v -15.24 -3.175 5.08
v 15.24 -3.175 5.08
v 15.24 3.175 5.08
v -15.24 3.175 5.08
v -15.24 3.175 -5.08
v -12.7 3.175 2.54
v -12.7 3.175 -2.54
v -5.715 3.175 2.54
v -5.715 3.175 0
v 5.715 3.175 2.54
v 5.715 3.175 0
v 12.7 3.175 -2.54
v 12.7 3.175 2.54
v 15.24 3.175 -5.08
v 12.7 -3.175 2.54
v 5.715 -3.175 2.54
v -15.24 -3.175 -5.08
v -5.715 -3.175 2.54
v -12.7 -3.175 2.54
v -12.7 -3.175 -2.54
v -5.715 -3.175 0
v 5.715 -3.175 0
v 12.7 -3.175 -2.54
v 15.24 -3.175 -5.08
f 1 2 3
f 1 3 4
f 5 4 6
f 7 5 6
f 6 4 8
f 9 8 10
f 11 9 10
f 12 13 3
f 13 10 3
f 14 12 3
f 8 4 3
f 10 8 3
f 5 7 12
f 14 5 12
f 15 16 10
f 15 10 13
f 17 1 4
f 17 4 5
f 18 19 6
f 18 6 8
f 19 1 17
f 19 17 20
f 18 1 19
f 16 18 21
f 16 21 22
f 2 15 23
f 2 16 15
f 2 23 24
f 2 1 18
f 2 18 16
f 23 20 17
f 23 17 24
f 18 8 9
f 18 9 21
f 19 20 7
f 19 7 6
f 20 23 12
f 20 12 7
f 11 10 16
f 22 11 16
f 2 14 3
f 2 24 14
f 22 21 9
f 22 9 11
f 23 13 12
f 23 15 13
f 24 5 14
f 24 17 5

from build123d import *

# Parameters (mm, degrees)
F0_W     = 21.59
F0_H     = 2.54
F1_DEPTH = 3.175
F2_W     = 11.43
F2_H     = 6.35
F3_DEPTH = 2.54


with BuildPart() as f1:
    # F0 (on Front) → F1 (new body, symmetric)
    with BuildSketch(Plane.XZ):
        Polygon((15.24, -5.08), (15.24, 5.08), (10.725581, 5.08), (10.725581, 2.54), (12.7, 2.54), (12.7, -2.54), (-12.7, -2.54), (-12.7, 2.54), (-10.864419, 2.54), (-10.864419, 5.08), (-15.24, 5.08), (-15.24, -5.08), align=None)
        with Locations((-0.069419, 3.81)):
            Rectangle(F0_W, F0_H)
    extrude(amount=F1_DEPTH, both=True)

    # F2 (on face) → F3 (join)
    with BuildSketch(Plane(origin=(0, 0, 2.54), x_dir=(1, 0, 0), z_dir=(0, 0, -1))):
        Rectangle(F2_W, F2_H)
    extrude(amount=F3_DEPTH)


solid = f1.part
